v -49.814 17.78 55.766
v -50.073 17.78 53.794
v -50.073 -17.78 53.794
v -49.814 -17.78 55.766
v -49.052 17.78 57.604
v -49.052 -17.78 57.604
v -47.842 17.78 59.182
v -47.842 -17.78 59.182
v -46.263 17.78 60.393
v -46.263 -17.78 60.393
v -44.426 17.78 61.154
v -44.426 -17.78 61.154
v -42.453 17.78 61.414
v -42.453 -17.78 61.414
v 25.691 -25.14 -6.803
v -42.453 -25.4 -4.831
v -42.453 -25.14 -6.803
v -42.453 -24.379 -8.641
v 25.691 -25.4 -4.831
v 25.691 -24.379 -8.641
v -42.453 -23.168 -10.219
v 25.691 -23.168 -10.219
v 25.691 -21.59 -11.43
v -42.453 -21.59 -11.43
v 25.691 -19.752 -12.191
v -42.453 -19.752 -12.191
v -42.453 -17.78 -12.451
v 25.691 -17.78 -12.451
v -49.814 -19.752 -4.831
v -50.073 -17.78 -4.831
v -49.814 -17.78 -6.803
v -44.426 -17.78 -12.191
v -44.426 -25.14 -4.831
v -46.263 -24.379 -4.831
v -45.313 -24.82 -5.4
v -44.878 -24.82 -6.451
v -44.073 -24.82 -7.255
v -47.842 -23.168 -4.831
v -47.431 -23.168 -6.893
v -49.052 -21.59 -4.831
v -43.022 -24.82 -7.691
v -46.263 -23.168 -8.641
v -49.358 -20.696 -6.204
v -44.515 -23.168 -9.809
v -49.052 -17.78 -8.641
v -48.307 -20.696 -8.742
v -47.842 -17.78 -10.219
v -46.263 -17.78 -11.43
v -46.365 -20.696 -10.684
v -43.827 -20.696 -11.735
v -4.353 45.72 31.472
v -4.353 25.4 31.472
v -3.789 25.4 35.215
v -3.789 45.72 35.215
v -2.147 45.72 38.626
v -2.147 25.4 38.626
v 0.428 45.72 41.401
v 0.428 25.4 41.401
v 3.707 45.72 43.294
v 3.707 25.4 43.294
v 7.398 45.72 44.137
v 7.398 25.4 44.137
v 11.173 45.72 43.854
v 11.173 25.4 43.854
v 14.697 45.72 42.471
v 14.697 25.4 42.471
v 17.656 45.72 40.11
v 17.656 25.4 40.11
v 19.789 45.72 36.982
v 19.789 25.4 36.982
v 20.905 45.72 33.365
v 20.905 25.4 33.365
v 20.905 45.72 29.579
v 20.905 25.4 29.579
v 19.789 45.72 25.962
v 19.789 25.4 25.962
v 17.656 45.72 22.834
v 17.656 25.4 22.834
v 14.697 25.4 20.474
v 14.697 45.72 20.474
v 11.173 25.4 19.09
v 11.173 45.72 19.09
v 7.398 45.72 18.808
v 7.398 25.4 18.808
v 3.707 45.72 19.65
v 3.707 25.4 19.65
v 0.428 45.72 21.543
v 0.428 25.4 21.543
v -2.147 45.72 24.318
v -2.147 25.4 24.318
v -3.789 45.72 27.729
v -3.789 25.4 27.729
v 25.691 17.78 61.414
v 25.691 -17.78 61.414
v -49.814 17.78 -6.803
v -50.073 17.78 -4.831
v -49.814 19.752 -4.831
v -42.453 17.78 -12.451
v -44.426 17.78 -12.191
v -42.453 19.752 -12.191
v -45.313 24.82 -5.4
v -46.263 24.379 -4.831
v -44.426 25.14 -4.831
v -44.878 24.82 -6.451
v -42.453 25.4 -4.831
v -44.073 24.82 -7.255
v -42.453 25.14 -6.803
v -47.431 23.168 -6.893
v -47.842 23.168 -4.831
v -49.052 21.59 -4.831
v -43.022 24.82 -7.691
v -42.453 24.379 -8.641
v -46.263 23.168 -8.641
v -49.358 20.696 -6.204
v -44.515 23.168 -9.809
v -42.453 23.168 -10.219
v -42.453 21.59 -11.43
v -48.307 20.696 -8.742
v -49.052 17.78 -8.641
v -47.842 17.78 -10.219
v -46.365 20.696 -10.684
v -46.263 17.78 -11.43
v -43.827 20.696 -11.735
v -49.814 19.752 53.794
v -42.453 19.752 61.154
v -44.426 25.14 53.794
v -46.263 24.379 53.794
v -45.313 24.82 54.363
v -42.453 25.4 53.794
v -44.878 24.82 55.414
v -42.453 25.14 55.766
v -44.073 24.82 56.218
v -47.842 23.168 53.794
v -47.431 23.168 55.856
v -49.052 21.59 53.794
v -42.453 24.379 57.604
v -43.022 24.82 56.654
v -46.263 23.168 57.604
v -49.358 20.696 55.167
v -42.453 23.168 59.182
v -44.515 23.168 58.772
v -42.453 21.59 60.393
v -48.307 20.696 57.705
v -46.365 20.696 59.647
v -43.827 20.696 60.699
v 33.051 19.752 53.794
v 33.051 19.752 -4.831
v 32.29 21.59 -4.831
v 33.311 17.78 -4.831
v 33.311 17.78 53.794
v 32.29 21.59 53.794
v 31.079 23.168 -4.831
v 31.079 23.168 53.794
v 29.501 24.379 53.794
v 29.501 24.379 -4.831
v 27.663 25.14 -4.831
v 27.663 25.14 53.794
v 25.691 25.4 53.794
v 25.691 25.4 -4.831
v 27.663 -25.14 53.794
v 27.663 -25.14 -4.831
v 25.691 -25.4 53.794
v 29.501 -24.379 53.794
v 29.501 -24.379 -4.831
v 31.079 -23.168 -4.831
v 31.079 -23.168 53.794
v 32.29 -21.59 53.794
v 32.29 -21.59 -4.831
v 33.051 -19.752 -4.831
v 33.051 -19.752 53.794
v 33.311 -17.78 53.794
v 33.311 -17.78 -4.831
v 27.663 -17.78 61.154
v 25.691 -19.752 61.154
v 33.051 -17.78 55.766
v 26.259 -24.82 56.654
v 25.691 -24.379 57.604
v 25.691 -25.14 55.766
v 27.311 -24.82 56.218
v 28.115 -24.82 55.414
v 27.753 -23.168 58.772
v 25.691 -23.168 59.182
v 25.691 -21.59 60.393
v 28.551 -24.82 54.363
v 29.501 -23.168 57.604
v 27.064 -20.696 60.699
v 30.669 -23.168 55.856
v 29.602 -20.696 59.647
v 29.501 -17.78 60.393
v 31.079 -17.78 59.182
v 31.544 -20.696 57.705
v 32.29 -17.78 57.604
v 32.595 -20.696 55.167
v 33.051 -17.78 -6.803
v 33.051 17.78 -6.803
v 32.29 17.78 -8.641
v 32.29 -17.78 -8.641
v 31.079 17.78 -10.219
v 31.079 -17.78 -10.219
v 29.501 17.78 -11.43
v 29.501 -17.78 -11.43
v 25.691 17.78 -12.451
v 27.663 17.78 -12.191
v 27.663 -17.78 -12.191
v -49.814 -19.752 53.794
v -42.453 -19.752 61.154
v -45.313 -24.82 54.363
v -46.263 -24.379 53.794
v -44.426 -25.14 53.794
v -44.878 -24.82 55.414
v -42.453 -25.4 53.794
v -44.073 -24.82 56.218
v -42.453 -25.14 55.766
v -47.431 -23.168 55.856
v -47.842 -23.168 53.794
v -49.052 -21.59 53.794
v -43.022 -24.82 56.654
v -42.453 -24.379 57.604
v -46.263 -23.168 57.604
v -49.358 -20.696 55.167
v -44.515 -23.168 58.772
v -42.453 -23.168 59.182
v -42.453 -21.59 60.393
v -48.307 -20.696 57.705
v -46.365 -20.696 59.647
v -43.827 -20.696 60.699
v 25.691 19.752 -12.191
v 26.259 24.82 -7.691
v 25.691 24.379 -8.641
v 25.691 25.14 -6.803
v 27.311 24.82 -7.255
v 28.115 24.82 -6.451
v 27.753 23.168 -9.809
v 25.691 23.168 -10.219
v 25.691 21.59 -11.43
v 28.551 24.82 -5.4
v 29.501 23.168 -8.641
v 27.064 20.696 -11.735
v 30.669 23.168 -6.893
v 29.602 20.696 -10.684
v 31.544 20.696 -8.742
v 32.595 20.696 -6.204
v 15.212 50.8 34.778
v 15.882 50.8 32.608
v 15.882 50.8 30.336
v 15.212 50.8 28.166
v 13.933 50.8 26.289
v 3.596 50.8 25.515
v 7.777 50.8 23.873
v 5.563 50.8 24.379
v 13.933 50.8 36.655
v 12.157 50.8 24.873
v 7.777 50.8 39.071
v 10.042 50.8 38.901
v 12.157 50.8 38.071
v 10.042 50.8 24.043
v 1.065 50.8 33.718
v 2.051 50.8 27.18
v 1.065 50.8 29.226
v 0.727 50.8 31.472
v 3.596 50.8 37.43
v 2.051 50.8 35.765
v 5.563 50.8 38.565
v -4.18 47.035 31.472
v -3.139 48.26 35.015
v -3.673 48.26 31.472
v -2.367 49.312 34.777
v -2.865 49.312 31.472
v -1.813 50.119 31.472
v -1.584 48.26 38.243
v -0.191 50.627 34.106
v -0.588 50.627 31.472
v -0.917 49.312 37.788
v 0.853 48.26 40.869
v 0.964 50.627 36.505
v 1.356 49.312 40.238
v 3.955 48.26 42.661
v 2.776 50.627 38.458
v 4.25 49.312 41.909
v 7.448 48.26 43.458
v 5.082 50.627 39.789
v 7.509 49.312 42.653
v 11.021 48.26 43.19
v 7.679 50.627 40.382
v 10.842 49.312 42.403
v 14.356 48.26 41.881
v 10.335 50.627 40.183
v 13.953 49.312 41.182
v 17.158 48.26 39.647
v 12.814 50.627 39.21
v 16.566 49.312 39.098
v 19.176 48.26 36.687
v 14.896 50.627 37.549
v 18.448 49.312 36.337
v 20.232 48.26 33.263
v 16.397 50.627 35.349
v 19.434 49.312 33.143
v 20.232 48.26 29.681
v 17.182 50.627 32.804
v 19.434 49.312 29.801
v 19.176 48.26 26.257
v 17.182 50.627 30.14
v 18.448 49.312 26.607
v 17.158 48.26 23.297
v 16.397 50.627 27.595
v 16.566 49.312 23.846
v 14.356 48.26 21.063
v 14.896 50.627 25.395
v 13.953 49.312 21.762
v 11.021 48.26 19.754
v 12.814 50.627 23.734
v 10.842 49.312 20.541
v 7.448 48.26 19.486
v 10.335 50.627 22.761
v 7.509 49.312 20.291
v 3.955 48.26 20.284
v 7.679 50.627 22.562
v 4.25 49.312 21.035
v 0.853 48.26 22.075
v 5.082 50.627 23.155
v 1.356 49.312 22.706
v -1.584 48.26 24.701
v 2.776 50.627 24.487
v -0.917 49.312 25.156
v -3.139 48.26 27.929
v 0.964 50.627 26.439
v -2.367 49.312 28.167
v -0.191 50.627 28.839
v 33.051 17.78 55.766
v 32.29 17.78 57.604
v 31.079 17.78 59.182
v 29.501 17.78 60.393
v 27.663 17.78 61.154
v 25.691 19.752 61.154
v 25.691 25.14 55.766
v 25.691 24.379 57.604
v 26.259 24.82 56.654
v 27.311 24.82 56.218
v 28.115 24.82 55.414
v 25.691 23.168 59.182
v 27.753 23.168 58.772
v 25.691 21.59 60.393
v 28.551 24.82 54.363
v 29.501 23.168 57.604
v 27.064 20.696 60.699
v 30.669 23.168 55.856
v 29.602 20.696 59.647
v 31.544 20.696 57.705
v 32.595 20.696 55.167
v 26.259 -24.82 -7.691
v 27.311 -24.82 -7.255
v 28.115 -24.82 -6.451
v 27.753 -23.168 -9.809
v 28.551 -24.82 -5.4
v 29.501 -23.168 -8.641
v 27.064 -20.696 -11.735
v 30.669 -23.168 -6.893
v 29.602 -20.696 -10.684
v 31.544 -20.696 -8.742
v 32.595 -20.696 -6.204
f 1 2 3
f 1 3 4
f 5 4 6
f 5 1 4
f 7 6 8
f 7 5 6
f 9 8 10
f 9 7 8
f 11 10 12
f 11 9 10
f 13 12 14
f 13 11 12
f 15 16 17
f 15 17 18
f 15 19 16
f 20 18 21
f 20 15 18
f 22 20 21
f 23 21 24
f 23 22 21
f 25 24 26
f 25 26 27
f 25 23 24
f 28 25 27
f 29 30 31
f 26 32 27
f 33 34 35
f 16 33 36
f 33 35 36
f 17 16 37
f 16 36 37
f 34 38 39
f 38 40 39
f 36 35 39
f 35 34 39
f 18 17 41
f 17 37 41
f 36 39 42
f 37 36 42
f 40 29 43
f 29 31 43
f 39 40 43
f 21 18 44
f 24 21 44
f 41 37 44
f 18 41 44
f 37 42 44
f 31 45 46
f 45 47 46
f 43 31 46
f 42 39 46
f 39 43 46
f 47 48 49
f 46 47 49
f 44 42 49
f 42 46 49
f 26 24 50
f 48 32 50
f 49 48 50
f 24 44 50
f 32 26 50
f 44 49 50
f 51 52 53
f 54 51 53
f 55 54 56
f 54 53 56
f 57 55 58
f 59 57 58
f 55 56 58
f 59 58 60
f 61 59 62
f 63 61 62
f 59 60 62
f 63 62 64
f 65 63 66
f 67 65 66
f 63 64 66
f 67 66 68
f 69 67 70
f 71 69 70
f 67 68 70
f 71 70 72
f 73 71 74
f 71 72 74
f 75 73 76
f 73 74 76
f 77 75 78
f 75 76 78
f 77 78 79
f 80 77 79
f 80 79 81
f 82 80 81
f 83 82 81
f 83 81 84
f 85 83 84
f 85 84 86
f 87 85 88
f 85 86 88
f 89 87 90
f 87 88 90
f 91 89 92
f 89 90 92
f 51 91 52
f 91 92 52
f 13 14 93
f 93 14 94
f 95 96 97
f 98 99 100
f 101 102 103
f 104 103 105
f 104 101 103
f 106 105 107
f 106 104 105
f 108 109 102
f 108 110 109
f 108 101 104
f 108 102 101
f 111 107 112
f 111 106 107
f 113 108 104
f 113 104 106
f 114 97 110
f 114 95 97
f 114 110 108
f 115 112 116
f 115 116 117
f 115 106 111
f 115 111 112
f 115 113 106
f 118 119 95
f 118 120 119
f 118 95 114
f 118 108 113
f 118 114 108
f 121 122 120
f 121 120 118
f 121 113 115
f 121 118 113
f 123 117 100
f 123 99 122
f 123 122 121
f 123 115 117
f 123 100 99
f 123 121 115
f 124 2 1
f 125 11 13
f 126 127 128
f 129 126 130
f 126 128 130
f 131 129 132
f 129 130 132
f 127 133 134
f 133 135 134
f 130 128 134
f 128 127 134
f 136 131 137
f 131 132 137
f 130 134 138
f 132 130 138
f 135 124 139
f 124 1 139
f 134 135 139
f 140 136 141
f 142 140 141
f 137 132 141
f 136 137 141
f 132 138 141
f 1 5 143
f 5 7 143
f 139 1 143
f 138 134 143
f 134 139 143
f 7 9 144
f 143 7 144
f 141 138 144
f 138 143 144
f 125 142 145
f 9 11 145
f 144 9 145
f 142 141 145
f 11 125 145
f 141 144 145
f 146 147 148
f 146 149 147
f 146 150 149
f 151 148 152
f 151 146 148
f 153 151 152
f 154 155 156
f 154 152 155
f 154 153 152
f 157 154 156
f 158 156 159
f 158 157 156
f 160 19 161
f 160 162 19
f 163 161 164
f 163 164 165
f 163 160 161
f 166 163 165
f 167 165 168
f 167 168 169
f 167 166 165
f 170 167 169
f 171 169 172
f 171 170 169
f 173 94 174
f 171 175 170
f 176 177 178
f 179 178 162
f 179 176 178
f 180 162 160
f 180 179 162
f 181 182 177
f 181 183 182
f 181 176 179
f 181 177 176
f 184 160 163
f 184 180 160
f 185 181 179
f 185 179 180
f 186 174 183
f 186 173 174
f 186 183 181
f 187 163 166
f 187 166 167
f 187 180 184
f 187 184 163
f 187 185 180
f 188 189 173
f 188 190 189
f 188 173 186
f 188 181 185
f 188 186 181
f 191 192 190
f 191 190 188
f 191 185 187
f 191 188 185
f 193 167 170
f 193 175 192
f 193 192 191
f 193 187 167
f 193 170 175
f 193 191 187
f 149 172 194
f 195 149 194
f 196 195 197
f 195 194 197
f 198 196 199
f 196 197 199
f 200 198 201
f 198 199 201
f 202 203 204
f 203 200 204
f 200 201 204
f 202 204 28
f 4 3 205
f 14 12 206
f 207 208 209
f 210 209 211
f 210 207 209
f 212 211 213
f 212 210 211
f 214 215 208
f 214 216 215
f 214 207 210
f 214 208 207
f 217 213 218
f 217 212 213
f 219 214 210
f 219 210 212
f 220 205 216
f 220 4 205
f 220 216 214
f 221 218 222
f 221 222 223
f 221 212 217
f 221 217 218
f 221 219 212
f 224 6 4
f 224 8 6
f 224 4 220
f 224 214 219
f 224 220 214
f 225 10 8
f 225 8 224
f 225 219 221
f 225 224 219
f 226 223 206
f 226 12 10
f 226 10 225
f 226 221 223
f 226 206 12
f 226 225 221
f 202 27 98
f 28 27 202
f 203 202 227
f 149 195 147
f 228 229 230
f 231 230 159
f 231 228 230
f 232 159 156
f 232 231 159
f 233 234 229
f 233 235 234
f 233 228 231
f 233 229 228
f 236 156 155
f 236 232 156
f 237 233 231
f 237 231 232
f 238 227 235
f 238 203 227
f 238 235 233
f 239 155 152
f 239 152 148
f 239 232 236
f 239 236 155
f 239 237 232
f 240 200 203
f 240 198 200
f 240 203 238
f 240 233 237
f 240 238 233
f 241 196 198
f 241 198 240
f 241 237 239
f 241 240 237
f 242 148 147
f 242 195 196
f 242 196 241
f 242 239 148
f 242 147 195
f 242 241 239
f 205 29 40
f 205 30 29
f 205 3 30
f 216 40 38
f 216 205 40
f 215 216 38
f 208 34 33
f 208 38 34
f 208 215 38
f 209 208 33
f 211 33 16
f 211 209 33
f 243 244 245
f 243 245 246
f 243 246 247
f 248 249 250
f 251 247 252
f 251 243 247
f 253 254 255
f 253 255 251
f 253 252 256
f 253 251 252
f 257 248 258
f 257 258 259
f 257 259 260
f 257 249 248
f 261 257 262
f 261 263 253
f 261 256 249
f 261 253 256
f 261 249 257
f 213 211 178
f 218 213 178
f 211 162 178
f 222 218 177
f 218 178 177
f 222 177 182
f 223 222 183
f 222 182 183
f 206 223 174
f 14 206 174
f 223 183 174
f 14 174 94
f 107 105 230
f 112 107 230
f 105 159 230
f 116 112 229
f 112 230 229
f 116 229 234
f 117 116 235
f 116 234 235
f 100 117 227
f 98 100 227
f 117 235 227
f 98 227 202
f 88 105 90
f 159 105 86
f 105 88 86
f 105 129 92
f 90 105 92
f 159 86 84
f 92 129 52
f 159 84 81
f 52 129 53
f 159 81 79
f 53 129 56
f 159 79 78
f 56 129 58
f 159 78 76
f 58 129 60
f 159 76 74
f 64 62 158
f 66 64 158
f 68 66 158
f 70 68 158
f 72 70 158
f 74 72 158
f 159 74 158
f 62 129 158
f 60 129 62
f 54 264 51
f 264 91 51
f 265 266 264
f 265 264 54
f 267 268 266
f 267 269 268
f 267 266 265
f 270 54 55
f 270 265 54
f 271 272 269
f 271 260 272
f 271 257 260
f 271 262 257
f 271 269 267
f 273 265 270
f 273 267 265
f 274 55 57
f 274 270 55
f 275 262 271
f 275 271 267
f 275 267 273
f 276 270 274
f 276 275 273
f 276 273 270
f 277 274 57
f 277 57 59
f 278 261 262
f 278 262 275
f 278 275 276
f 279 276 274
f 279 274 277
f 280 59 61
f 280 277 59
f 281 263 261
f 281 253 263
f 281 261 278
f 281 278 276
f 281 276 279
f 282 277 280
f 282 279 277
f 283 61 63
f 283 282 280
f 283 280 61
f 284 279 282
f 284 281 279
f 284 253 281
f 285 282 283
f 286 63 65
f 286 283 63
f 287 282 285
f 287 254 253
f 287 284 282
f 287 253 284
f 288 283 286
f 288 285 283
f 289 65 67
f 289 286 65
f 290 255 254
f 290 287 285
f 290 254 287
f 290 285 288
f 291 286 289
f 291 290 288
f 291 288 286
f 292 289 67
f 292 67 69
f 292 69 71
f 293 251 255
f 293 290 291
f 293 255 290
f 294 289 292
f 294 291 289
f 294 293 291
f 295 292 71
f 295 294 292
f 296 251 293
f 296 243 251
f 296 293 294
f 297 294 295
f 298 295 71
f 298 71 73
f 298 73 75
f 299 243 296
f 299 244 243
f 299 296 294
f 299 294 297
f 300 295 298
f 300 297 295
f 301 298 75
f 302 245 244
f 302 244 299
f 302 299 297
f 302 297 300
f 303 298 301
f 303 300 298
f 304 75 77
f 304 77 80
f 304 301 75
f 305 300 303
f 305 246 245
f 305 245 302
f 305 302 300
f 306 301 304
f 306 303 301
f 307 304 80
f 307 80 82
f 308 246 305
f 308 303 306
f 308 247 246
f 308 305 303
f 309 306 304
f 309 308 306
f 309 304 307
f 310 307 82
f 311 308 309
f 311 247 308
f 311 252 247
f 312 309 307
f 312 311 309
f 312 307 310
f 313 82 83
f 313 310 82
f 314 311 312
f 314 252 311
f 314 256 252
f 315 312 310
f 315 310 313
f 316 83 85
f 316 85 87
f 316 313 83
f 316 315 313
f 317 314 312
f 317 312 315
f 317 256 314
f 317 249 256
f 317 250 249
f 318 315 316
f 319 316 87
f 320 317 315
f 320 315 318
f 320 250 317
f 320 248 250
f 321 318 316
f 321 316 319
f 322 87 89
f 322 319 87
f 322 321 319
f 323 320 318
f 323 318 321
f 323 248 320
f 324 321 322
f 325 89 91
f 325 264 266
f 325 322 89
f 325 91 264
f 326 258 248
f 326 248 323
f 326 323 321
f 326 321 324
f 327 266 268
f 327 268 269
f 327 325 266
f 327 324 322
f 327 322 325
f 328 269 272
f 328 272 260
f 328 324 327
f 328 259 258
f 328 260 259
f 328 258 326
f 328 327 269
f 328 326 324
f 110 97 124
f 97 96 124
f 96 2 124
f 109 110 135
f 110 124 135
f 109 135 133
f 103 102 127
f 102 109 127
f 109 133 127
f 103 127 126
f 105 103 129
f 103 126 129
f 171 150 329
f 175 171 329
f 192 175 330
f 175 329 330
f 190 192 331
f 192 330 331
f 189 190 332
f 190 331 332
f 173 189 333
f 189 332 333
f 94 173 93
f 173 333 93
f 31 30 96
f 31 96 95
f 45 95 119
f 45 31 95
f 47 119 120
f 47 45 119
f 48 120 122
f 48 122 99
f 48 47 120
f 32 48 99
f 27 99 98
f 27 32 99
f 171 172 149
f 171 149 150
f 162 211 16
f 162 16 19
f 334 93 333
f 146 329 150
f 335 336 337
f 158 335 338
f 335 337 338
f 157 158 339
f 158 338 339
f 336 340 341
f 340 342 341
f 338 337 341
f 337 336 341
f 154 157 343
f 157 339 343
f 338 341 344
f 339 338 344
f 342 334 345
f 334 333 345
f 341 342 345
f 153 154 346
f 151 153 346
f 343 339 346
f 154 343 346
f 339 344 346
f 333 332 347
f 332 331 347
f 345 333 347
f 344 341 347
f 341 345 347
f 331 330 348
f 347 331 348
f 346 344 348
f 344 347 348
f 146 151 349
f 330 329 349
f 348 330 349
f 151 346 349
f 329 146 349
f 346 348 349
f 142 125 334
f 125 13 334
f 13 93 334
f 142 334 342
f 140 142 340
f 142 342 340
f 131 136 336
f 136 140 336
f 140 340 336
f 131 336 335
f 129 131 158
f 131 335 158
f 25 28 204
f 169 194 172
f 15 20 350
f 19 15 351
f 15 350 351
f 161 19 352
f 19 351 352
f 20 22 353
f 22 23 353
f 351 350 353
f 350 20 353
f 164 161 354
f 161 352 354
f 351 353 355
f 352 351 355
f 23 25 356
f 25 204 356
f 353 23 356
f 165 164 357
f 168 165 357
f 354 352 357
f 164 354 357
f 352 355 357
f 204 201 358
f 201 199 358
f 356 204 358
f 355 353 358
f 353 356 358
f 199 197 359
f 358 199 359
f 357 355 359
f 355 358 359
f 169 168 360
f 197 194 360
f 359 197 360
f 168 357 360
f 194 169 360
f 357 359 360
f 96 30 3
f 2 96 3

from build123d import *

# Parameters (mm, degrees)
F0_W     = 83.383921
F0_H     = 73.864564
F1_DEPTH = 25.4
F2_R     = 7.62
F3_R     = 12.7
F4_DEPTH = 25.4
F5_R     = 5.08


with BuildPart() as f1:
    # F0 (on Front) → F1 (new body, symmetric)
    with BuildSketch(Plane.XZ):
        with Locations((-8.381387, 24.481572)):
            Rectangle(F0_W, F0_H)
    extrude(amount=F1_DEPTH, both=True)

    # F2
    f2_edges = [f1.edges().sort_by_distance(p)[0] for p in [
        (-50.073348, 0, -12.45071),
        (33.310573, 0, -12.45071),
        (33.310573, 0, 61.413854),
        (-50.073348, 0, 61.413854),
        (-50.073348, 25.4, 24.481572),
        (-50.073348, -25.4, 24.481572),
        (-8.381388, 25.4, 61.413854),
        (-8.381388, 25.4, -12.45071),
        (33.310573, 25.4, 24.481572),
        (-8.381388, -25.4, 61.413854),
        (-8.381388, -25.4, -12.45071),
        (33.310573, -25.4, 24.481572),
    ]]
    fillet(f2_edges, radius=F2_R)

    # F3 (on face) → F4 (join)
    with BuildSketch(Plane(origin=(0, 25.4, 0), x_dir=(-1, 0, 0), z_dir=(0, 1, 0))):
        with Locations((-8.346652, 31.472079)):
            Circle(F3_R)
    extrude(amount=F4_DEPTH)

    # F5
    f5_edges = [f1.edges().sort_by_distance(p)[0] for p in [
        (21.046652, 50.8, 31.472079),
    ]]
    fillet(f5_edges, radius=F5_R)


solid = f1.part
